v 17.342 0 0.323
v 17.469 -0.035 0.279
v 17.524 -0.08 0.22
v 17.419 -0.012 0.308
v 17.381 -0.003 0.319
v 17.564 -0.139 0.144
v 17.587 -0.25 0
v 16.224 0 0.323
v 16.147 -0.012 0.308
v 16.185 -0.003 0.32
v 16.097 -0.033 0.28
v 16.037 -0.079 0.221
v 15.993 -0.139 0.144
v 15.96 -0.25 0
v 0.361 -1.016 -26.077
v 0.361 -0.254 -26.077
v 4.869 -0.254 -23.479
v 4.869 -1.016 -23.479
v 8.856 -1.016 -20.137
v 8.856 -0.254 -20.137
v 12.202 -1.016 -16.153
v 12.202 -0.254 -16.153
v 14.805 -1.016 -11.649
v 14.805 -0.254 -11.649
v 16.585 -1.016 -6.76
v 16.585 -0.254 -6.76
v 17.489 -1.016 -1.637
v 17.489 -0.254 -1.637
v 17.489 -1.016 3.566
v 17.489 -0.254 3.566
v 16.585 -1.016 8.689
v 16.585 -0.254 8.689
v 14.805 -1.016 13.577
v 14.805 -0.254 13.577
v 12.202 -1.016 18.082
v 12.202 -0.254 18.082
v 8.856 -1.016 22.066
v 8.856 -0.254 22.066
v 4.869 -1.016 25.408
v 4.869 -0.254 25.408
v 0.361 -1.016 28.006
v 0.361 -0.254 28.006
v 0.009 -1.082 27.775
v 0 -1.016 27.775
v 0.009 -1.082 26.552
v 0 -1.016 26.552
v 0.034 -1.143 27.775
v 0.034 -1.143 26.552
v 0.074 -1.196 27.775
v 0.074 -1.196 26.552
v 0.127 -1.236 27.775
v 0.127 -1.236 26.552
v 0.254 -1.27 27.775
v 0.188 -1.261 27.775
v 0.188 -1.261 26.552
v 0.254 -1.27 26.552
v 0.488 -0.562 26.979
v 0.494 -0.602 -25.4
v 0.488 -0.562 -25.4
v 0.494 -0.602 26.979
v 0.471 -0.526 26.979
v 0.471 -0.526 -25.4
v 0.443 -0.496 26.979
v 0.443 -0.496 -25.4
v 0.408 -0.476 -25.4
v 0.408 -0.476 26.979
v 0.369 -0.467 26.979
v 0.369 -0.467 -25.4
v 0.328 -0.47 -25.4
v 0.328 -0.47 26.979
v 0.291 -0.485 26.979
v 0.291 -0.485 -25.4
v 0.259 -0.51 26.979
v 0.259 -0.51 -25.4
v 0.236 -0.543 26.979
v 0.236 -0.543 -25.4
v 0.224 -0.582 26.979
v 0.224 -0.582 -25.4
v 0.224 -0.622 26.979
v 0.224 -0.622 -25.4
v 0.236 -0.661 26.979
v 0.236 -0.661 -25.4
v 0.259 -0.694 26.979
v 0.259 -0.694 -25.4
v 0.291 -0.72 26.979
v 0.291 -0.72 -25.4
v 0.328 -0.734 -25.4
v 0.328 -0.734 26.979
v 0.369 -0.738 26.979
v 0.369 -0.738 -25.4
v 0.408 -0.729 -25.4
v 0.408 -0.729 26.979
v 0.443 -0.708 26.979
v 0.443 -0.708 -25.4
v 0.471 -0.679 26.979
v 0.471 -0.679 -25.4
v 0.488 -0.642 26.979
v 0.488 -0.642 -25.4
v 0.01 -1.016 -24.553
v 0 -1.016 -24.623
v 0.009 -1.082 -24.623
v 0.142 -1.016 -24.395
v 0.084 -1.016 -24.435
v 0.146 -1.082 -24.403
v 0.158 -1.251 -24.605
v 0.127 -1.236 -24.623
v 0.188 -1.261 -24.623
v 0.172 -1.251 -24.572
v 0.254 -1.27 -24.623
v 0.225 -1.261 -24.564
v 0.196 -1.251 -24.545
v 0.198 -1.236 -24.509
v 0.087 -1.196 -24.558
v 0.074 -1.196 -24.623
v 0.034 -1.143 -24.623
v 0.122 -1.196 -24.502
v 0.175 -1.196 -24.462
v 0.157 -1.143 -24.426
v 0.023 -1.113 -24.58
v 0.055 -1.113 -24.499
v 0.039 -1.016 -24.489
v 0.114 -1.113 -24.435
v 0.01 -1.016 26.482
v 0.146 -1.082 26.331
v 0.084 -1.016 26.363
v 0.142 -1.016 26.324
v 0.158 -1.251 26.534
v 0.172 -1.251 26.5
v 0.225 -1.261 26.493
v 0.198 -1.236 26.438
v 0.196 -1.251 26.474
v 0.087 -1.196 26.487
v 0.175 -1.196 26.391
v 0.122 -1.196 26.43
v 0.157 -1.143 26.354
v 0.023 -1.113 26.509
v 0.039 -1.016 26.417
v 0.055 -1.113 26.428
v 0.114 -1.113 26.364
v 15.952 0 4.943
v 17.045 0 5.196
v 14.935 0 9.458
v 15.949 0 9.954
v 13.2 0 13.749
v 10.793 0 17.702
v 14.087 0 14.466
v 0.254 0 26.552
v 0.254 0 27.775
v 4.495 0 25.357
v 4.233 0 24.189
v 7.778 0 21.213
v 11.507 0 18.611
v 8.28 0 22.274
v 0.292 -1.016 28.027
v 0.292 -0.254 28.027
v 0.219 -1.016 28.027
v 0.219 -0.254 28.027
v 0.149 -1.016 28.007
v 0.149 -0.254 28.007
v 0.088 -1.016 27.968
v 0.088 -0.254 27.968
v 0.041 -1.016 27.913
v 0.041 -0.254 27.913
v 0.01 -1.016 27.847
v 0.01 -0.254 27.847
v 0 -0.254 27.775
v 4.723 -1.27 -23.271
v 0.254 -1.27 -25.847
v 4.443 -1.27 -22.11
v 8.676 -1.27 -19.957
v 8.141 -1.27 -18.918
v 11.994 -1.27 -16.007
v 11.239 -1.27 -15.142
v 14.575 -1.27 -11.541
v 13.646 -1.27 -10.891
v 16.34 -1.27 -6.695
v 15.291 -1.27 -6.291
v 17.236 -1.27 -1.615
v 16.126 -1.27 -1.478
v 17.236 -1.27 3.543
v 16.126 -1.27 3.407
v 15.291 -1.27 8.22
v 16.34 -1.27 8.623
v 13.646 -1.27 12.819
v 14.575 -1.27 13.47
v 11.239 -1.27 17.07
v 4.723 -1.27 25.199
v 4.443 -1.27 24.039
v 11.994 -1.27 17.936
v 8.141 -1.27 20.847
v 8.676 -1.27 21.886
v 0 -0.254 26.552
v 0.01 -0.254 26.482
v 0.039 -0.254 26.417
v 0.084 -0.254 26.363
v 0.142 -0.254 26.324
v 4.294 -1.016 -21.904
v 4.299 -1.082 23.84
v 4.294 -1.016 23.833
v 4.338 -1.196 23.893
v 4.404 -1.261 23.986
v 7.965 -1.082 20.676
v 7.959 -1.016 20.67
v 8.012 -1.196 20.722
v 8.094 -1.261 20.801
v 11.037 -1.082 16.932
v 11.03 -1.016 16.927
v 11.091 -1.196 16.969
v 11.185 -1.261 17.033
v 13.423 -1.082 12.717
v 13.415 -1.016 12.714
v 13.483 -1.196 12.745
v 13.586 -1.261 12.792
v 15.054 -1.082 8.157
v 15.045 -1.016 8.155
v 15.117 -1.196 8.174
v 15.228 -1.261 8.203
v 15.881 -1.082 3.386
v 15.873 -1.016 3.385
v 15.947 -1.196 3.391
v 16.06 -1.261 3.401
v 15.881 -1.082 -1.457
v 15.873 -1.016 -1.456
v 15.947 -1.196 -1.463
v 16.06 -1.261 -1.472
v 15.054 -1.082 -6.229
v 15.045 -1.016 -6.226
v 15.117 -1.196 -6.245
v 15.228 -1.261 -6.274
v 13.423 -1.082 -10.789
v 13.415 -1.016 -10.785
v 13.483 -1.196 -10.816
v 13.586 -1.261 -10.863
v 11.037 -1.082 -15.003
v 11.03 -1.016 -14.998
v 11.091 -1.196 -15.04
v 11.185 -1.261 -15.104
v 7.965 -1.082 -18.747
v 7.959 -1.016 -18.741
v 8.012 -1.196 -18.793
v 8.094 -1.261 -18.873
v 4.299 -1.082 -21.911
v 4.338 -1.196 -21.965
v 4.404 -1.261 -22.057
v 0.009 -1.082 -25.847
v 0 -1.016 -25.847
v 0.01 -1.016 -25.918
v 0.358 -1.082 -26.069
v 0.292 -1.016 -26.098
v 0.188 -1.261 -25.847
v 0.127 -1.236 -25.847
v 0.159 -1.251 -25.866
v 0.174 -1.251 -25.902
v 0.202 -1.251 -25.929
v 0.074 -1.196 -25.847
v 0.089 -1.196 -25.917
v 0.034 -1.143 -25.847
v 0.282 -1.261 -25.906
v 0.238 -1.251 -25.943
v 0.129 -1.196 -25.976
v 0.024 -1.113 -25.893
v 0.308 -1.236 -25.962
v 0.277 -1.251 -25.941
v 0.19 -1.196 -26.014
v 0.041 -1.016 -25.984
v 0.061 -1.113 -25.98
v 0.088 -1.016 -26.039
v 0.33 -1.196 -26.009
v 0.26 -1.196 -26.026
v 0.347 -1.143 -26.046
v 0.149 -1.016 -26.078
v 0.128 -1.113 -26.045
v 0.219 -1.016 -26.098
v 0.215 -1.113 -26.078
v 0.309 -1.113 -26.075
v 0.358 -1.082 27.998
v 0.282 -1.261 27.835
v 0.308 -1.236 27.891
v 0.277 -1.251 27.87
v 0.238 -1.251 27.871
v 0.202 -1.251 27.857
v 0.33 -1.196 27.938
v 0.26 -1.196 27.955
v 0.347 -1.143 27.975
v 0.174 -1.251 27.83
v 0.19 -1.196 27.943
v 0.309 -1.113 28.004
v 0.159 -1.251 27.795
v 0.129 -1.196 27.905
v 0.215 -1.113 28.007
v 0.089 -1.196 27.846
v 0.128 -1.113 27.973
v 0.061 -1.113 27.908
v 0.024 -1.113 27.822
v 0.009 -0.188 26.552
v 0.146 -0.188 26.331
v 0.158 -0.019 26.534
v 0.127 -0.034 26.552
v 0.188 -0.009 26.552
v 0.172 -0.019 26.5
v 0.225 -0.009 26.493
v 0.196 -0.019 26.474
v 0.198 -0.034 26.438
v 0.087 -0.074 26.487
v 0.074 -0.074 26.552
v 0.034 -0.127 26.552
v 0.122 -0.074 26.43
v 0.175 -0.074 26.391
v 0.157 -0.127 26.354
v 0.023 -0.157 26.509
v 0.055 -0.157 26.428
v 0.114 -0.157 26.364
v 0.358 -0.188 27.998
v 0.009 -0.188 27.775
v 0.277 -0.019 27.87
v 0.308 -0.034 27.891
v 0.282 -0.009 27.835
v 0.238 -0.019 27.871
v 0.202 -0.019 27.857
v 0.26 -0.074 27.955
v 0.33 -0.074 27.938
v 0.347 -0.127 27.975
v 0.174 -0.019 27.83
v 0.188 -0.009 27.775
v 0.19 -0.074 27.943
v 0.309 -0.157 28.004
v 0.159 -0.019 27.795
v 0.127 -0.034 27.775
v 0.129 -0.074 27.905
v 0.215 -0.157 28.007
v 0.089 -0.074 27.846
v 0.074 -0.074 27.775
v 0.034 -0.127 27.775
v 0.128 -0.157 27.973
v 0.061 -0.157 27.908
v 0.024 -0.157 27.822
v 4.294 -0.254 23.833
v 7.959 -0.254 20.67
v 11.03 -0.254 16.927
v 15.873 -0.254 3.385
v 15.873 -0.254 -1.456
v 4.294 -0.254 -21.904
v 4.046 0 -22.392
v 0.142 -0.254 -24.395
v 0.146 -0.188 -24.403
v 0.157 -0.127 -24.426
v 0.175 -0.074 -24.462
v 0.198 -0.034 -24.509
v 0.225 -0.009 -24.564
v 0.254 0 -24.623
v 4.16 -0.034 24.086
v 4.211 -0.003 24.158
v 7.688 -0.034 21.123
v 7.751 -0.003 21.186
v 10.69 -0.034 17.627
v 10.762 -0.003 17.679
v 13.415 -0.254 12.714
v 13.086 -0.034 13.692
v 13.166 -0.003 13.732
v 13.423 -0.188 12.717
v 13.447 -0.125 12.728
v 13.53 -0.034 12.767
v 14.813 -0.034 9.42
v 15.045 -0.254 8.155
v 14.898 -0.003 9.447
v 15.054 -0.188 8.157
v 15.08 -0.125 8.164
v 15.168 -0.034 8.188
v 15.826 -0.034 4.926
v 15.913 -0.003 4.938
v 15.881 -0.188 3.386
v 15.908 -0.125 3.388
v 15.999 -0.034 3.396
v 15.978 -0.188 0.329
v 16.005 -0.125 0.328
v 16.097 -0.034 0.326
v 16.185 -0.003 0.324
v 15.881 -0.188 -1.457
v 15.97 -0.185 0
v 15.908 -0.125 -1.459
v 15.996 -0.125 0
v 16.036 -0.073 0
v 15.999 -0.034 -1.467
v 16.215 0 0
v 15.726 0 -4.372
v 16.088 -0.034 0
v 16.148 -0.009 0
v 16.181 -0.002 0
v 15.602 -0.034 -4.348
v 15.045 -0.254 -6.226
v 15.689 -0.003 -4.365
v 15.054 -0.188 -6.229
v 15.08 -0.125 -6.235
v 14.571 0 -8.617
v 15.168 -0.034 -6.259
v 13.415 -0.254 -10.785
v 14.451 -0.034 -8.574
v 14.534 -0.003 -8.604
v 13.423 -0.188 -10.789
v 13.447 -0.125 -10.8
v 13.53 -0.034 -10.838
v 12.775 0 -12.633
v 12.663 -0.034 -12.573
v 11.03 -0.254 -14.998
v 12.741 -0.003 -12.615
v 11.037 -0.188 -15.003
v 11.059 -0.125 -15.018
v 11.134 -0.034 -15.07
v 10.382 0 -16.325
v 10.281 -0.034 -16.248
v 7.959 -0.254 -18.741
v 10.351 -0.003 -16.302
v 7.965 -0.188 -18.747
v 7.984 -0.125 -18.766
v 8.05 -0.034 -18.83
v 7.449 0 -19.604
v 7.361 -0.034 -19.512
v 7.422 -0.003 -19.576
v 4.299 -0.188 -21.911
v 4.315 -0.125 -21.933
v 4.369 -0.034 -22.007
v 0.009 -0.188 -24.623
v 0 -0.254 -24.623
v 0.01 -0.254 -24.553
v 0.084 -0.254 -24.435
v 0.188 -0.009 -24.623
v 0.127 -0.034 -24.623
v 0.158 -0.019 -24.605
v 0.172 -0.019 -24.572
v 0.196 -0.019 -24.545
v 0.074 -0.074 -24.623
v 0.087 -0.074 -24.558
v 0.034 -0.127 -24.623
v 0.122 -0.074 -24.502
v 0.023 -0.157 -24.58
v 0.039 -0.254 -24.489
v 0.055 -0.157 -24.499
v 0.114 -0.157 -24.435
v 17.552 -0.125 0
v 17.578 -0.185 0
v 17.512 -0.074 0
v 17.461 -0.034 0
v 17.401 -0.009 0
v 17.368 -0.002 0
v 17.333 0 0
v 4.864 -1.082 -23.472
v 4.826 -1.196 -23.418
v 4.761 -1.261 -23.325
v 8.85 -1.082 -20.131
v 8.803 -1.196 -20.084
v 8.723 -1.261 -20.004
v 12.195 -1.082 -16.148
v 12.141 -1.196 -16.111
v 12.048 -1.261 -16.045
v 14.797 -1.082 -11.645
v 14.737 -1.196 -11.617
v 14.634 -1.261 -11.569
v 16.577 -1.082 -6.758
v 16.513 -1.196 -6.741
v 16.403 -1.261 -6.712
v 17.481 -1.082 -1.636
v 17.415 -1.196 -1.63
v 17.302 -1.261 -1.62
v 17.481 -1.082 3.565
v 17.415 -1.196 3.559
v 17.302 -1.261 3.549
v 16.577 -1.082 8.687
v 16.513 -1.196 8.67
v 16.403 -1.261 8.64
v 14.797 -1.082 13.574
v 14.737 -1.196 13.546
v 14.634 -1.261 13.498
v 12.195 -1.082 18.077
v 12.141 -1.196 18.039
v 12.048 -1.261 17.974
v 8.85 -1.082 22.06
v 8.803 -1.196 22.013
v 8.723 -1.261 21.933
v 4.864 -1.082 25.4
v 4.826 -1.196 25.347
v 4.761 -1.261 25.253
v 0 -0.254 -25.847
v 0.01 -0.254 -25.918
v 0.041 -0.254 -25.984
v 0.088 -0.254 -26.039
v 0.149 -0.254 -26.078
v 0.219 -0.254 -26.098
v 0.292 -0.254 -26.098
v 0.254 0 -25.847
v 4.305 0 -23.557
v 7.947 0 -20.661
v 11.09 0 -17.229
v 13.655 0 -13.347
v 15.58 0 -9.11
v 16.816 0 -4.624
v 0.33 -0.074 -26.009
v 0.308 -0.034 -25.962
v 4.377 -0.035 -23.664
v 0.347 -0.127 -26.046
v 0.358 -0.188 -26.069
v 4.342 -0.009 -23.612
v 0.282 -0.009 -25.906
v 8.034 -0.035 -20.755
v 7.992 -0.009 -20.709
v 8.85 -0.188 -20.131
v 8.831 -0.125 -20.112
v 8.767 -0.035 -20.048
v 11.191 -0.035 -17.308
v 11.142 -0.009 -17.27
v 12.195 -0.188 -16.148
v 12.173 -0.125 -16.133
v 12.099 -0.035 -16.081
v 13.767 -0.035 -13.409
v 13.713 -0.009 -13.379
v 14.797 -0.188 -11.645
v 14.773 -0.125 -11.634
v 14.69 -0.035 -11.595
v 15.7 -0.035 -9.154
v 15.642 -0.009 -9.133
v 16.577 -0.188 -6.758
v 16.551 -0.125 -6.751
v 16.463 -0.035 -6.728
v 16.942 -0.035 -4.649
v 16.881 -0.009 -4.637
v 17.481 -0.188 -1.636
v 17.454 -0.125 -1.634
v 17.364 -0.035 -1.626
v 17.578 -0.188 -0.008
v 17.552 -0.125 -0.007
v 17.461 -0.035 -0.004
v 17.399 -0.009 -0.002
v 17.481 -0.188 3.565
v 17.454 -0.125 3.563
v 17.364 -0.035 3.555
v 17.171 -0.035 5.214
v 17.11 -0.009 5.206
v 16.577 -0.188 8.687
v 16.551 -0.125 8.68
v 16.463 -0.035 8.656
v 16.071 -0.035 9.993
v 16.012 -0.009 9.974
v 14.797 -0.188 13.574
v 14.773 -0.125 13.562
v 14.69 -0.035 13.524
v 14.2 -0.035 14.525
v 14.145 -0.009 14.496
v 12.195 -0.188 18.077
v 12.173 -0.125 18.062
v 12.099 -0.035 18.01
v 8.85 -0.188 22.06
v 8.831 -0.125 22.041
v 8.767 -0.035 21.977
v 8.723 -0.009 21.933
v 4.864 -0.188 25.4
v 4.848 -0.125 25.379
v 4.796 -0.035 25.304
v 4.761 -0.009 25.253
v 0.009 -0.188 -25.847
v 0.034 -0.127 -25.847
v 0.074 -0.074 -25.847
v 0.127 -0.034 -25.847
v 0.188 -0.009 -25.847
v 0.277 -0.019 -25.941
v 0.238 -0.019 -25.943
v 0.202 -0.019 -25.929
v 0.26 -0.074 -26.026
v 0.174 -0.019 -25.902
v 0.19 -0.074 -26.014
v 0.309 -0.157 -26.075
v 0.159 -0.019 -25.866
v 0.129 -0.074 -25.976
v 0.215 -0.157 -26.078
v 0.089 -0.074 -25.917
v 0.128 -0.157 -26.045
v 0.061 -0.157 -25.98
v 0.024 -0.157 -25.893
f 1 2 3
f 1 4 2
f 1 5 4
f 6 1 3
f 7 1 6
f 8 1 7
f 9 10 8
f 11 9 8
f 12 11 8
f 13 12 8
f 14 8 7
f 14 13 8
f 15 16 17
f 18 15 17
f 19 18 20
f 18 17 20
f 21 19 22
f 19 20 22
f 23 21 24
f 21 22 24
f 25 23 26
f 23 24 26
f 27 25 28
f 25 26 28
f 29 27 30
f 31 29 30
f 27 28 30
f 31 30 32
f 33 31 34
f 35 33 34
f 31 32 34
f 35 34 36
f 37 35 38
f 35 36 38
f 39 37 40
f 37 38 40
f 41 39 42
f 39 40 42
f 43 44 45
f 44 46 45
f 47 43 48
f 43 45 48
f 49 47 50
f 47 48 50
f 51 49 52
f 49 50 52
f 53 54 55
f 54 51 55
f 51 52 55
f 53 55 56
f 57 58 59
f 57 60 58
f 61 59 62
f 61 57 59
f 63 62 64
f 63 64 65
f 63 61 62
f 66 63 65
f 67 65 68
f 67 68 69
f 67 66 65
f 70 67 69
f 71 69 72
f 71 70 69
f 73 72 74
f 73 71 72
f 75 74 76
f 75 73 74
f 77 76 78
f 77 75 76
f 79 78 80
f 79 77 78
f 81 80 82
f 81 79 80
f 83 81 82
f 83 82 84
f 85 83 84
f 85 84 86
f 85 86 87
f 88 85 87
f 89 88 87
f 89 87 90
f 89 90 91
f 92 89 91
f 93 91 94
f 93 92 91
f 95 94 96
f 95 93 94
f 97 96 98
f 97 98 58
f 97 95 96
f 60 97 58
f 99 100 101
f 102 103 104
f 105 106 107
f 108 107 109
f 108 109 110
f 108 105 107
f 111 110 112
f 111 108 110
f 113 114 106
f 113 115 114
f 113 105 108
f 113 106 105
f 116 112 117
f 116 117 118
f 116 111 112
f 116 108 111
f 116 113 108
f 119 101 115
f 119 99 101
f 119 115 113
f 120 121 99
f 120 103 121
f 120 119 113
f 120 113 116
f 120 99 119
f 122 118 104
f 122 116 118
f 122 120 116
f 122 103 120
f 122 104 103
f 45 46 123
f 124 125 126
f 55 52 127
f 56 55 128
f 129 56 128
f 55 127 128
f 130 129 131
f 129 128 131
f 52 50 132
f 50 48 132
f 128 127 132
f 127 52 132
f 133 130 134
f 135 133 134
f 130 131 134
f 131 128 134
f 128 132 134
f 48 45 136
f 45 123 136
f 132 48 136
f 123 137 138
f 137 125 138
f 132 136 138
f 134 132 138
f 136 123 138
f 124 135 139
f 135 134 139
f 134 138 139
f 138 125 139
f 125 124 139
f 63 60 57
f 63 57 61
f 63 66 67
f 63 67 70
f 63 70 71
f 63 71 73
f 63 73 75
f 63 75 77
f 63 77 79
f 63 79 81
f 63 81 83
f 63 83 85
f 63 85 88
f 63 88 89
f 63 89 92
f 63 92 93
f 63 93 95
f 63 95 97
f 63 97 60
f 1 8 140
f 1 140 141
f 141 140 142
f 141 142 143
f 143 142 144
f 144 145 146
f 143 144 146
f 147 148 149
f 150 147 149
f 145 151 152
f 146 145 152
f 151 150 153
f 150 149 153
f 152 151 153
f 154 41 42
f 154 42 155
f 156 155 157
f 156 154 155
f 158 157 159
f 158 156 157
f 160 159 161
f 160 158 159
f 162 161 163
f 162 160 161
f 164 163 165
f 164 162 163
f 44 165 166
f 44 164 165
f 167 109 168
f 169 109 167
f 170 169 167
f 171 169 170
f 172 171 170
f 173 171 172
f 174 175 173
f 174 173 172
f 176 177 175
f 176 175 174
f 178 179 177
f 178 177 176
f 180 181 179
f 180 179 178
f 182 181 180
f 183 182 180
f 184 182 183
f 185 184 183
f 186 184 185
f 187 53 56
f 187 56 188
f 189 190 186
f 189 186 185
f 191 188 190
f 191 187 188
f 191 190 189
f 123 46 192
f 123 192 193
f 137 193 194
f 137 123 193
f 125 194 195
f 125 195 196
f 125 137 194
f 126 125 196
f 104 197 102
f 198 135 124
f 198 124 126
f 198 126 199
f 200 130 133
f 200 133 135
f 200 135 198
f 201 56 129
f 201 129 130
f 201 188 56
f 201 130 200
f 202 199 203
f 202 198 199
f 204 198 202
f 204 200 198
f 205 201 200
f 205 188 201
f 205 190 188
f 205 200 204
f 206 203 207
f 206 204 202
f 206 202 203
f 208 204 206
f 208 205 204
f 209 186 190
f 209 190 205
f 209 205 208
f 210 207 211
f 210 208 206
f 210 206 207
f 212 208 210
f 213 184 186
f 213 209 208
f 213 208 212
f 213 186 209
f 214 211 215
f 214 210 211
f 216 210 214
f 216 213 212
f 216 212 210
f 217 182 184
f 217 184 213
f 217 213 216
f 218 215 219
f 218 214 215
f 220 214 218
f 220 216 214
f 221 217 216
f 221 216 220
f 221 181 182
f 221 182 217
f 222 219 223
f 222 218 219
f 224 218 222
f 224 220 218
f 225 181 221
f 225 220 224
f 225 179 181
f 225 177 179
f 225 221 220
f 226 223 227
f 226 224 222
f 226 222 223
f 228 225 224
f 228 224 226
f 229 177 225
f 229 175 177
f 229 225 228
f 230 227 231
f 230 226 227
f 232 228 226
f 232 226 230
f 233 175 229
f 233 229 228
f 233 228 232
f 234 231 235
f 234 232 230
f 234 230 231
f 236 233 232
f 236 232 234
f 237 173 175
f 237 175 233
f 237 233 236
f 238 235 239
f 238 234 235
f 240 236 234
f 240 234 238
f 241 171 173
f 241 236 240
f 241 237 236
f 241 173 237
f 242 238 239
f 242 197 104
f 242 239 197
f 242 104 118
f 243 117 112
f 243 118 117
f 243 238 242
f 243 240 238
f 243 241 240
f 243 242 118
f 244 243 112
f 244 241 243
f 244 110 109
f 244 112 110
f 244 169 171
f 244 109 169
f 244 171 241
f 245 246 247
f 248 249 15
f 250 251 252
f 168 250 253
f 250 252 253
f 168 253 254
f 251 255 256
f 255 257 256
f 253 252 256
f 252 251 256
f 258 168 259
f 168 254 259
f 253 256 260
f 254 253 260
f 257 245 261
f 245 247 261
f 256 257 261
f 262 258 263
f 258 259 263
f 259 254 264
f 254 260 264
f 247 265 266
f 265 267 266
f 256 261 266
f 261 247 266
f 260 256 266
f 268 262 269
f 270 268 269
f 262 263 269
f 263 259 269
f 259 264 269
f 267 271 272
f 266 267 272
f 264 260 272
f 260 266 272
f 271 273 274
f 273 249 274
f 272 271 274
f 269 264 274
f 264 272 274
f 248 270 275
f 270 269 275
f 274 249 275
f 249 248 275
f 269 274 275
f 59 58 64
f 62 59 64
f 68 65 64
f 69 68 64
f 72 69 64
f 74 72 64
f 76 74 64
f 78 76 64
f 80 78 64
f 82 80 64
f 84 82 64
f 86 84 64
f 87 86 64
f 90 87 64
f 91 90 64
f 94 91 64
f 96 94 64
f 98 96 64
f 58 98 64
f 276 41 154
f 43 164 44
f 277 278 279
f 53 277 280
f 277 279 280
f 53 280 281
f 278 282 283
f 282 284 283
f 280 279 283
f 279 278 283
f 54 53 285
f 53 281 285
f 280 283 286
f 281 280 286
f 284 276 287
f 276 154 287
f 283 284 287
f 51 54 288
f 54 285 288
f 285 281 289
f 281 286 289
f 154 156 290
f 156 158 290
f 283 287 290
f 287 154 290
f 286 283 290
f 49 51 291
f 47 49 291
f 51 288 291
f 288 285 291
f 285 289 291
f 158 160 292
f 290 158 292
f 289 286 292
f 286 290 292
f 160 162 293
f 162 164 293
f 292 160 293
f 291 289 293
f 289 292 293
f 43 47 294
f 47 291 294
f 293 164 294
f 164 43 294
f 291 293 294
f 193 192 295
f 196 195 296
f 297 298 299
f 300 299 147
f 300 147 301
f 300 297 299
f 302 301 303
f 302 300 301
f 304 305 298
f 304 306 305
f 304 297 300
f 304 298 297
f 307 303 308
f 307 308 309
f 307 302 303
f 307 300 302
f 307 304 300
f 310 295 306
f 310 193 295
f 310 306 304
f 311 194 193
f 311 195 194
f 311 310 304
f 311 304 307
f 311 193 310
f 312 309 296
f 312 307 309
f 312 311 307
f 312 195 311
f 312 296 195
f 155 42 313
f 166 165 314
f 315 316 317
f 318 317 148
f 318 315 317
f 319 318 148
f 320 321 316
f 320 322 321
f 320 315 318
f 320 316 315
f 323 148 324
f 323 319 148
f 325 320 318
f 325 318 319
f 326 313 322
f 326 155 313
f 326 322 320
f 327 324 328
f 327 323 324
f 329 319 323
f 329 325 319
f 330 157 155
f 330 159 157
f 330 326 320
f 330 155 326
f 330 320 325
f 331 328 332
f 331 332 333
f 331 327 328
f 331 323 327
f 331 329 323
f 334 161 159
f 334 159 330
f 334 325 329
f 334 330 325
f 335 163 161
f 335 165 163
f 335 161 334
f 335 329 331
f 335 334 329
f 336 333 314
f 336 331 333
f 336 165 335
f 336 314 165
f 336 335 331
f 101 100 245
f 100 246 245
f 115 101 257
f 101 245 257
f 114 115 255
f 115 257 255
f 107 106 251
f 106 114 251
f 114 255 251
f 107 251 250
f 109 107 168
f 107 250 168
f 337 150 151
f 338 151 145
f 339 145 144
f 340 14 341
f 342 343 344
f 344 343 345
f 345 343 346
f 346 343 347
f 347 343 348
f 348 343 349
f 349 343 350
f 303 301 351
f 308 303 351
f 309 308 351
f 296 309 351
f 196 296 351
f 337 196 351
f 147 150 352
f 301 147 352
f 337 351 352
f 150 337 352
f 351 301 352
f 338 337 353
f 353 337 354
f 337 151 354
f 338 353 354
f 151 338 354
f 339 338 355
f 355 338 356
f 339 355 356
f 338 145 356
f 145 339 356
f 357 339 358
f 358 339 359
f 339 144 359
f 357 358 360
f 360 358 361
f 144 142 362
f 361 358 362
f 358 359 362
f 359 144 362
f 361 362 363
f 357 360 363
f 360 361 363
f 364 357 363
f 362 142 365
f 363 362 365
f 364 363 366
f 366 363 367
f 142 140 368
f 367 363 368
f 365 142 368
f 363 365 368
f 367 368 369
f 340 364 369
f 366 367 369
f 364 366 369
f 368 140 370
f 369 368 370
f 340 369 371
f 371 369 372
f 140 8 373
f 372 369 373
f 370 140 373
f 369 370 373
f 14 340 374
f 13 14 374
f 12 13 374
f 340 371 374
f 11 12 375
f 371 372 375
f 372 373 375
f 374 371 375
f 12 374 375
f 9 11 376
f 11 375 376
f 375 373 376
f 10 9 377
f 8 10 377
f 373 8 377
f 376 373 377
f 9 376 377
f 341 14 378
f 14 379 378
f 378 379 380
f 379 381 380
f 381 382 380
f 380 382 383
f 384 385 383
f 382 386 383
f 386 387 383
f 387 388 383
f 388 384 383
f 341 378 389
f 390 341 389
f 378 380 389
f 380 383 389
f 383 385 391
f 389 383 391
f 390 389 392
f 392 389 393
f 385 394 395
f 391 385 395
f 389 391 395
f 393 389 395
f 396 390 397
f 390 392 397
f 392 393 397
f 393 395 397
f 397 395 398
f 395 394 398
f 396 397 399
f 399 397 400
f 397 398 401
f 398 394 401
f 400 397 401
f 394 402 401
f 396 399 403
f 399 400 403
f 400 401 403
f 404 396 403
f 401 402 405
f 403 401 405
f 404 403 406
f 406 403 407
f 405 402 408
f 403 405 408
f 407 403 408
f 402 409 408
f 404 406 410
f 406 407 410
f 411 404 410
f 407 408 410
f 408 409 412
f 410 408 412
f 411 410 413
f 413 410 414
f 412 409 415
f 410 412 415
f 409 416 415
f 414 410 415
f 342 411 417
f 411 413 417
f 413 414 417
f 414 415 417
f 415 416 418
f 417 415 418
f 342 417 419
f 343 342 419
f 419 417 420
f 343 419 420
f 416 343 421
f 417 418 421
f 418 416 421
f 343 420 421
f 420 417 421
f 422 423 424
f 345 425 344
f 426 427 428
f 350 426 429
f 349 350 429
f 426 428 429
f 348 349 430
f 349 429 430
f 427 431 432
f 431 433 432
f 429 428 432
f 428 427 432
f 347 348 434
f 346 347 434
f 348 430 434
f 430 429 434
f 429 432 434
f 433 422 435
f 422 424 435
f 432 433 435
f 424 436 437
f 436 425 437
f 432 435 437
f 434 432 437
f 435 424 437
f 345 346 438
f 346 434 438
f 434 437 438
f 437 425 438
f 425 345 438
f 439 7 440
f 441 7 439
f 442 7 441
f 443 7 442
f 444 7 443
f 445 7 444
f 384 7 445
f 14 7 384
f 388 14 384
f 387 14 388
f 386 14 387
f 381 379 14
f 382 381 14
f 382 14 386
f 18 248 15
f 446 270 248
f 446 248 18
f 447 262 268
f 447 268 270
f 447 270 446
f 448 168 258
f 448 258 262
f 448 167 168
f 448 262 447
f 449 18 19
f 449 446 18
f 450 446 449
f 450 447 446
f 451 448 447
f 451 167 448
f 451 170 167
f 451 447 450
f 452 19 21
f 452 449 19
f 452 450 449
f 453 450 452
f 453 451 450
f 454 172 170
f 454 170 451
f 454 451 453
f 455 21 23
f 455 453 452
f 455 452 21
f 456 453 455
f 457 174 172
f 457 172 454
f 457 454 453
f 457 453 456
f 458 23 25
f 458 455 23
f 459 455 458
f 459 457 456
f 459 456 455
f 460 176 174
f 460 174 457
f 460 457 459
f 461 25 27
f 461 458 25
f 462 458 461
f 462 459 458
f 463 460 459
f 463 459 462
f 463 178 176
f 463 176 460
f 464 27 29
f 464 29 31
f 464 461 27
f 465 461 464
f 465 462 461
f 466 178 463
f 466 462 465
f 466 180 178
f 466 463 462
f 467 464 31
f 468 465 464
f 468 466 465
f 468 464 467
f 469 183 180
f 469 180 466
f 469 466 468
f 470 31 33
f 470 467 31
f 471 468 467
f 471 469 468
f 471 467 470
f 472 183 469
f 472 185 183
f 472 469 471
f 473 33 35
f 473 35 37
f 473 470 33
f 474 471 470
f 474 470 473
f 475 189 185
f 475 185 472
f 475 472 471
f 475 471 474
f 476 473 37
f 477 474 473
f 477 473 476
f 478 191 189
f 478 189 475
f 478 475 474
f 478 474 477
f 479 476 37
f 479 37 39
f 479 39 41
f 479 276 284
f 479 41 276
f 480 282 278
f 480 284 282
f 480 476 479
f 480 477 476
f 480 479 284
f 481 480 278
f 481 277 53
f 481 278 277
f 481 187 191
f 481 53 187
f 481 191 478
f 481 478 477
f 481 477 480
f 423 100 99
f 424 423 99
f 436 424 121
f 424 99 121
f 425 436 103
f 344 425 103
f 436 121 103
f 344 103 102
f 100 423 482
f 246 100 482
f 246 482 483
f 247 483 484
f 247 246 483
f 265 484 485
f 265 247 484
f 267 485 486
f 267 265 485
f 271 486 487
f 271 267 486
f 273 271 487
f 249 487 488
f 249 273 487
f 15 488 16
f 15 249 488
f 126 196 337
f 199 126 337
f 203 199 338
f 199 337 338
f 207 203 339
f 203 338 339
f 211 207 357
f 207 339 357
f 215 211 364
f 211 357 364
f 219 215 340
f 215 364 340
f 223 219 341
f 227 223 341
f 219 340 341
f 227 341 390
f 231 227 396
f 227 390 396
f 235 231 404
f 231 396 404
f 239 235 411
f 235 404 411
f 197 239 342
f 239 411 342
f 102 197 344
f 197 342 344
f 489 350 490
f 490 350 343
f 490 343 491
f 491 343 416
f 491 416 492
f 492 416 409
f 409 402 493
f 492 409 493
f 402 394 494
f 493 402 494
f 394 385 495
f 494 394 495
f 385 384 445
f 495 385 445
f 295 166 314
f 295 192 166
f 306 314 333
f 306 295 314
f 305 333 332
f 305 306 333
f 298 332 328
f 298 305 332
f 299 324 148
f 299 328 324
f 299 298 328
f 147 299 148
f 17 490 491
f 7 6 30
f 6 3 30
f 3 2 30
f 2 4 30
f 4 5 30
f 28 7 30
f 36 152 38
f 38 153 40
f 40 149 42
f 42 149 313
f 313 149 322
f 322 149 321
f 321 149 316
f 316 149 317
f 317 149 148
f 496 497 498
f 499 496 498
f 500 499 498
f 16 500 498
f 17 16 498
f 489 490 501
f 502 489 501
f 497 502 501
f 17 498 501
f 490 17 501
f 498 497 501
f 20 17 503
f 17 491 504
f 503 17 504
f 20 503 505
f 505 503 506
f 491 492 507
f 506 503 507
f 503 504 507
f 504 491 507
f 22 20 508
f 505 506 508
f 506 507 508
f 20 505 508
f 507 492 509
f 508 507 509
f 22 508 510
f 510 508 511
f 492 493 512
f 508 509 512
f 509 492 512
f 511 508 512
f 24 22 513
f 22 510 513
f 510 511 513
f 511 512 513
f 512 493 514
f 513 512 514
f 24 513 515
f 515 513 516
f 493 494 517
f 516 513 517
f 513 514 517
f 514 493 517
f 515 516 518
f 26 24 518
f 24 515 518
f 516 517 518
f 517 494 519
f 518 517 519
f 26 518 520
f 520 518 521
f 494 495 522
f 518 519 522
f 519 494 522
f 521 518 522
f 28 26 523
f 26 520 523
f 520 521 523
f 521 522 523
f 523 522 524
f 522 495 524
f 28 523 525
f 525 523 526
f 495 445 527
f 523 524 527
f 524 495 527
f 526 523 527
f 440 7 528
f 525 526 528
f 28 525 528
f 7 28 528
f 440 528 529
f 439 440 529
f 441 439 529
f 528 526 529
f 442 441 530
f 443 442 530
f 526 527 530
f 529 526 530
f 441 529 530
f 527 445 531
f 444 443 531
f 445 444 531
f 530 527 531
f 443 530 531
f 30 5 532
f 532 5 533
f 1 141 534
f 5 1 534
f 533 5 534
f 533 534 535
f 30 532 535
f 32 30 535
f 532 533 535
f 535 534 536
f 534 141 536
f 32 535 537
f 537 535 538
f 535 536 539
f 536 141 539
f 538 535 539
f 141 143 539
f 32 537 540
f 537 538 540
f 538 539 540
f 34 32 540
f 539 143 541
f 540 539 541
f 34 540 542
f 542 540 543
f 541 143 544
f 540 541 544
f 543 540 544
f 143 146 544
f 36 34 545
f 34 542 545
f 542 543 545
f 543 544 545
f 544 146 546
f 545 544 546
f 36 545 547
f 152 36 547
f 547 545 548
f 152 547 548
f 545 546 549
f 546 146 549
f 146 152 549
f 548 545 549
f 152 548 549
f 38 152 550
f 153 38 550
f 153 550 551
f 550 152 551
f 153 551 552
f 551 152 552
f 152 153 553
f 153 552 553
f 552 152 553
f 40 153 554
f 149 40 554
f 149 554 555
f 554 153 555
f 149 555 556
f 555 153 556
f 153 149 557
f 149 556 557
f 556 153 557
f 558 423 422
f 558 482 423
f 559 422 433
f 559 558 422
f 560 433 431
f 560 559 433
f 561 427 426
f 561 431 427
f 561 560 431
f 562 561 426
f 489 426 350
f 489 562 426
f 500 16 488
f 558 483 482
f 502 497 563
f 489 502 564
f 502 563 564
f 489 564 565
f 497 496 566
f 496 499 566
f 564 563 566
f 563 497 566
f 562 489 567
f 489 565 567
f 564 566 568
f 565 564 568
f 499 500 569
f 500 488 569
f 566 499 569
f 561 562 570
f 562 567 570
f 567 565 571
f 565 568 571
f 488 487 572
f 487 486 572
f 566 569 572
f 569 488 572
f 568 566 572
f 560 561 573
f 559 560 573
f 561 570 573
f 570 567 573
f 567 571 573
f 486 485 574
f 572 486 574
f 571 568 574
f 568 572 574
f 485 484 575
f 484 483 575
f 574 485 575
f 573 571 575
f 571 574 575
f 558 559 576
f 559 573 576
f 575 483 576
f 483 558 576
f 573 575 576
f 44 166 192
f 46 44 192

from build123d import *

# Parameters (mm, degrees)
F1_DEPTH      = 1.27
F2_R          = 0.254
F3_R          = 0.135782909
F4_DEPTH      = 26.97885
F4_DEPTH_BACK = 25.4
F6_DEPTH      = 25.4
F6_DEPTH_BACK = 25.4


with BuildPart() as f1:
    # F0 (on Front) → F1 (new body)
    with BuildSketch(Plane.XZ):
        with BuildLine():
            Line((0, -24.4641060061), (0, -26.2421060061))
            ThreePointArc((0, -26.2421060061), (17.6028633466, 0.9643622648), (0, 28.1708305358))
            Line((0, 28.1708305358), (0, 26.3928305358))
            ThreePointArc((0, 26.3928305358), (15.9768513956, 0.9643622648), (0, -24.4641060061))
        make_face()
    extrude(amount=F1_DEPTH)

    # F2
    f2_edges = [f1.edges().sort_by_distance(p)[0] for p in [
        (0, -0.635, 26.392831),
        (0, -1.27, 27.281831),
        (0, 0, 27.281831),
        (0, -0.635, 28.170831),
        (17.602863, -1.27, 0.964362),
        (17.602863, 0, 0.964362),
        (15.976851, -1.27, 0.964362),
        (15.976851, 0, 0.964362),
        (0, -0.635, -24.464106),
        (0, 0, -25.353106),
        (0, -0.635, -26.242106),
        (0, -1.27, -25.353106),
    ]]
    fillet(f2_edges, radius=F2_R)

    # F5 (on Right) → F6 (cut, two sides)
    with BuildSketch(Plane.YZ) as f6_sk:
        Polygon((-0.2504991426, 0), (0, 0), (0, 0.3233448078), align=None)
    extrude(amount=-F6_DEPTH, mode=Mode.SUBTRACT)
    extrude(f6_sk.sketch, amount=F6_DEPTH_BACK, mode=Mode.SUBTRACT)


with BuildPart() as f4:
    # F3 (on Top) → F4 (new body, two sides)
    with BuildSketch(Plane.XY) as f4_sk:
        with Locations((0.3584586375, -0.6021122681)):
            Circle(F3_R)
    extrude(amount=F4_DEPTH)
    extrude(f4_sk.sketch, amount=-F4_DEPTH_BACK)


solid = Compound([f1.part, f4.part])
